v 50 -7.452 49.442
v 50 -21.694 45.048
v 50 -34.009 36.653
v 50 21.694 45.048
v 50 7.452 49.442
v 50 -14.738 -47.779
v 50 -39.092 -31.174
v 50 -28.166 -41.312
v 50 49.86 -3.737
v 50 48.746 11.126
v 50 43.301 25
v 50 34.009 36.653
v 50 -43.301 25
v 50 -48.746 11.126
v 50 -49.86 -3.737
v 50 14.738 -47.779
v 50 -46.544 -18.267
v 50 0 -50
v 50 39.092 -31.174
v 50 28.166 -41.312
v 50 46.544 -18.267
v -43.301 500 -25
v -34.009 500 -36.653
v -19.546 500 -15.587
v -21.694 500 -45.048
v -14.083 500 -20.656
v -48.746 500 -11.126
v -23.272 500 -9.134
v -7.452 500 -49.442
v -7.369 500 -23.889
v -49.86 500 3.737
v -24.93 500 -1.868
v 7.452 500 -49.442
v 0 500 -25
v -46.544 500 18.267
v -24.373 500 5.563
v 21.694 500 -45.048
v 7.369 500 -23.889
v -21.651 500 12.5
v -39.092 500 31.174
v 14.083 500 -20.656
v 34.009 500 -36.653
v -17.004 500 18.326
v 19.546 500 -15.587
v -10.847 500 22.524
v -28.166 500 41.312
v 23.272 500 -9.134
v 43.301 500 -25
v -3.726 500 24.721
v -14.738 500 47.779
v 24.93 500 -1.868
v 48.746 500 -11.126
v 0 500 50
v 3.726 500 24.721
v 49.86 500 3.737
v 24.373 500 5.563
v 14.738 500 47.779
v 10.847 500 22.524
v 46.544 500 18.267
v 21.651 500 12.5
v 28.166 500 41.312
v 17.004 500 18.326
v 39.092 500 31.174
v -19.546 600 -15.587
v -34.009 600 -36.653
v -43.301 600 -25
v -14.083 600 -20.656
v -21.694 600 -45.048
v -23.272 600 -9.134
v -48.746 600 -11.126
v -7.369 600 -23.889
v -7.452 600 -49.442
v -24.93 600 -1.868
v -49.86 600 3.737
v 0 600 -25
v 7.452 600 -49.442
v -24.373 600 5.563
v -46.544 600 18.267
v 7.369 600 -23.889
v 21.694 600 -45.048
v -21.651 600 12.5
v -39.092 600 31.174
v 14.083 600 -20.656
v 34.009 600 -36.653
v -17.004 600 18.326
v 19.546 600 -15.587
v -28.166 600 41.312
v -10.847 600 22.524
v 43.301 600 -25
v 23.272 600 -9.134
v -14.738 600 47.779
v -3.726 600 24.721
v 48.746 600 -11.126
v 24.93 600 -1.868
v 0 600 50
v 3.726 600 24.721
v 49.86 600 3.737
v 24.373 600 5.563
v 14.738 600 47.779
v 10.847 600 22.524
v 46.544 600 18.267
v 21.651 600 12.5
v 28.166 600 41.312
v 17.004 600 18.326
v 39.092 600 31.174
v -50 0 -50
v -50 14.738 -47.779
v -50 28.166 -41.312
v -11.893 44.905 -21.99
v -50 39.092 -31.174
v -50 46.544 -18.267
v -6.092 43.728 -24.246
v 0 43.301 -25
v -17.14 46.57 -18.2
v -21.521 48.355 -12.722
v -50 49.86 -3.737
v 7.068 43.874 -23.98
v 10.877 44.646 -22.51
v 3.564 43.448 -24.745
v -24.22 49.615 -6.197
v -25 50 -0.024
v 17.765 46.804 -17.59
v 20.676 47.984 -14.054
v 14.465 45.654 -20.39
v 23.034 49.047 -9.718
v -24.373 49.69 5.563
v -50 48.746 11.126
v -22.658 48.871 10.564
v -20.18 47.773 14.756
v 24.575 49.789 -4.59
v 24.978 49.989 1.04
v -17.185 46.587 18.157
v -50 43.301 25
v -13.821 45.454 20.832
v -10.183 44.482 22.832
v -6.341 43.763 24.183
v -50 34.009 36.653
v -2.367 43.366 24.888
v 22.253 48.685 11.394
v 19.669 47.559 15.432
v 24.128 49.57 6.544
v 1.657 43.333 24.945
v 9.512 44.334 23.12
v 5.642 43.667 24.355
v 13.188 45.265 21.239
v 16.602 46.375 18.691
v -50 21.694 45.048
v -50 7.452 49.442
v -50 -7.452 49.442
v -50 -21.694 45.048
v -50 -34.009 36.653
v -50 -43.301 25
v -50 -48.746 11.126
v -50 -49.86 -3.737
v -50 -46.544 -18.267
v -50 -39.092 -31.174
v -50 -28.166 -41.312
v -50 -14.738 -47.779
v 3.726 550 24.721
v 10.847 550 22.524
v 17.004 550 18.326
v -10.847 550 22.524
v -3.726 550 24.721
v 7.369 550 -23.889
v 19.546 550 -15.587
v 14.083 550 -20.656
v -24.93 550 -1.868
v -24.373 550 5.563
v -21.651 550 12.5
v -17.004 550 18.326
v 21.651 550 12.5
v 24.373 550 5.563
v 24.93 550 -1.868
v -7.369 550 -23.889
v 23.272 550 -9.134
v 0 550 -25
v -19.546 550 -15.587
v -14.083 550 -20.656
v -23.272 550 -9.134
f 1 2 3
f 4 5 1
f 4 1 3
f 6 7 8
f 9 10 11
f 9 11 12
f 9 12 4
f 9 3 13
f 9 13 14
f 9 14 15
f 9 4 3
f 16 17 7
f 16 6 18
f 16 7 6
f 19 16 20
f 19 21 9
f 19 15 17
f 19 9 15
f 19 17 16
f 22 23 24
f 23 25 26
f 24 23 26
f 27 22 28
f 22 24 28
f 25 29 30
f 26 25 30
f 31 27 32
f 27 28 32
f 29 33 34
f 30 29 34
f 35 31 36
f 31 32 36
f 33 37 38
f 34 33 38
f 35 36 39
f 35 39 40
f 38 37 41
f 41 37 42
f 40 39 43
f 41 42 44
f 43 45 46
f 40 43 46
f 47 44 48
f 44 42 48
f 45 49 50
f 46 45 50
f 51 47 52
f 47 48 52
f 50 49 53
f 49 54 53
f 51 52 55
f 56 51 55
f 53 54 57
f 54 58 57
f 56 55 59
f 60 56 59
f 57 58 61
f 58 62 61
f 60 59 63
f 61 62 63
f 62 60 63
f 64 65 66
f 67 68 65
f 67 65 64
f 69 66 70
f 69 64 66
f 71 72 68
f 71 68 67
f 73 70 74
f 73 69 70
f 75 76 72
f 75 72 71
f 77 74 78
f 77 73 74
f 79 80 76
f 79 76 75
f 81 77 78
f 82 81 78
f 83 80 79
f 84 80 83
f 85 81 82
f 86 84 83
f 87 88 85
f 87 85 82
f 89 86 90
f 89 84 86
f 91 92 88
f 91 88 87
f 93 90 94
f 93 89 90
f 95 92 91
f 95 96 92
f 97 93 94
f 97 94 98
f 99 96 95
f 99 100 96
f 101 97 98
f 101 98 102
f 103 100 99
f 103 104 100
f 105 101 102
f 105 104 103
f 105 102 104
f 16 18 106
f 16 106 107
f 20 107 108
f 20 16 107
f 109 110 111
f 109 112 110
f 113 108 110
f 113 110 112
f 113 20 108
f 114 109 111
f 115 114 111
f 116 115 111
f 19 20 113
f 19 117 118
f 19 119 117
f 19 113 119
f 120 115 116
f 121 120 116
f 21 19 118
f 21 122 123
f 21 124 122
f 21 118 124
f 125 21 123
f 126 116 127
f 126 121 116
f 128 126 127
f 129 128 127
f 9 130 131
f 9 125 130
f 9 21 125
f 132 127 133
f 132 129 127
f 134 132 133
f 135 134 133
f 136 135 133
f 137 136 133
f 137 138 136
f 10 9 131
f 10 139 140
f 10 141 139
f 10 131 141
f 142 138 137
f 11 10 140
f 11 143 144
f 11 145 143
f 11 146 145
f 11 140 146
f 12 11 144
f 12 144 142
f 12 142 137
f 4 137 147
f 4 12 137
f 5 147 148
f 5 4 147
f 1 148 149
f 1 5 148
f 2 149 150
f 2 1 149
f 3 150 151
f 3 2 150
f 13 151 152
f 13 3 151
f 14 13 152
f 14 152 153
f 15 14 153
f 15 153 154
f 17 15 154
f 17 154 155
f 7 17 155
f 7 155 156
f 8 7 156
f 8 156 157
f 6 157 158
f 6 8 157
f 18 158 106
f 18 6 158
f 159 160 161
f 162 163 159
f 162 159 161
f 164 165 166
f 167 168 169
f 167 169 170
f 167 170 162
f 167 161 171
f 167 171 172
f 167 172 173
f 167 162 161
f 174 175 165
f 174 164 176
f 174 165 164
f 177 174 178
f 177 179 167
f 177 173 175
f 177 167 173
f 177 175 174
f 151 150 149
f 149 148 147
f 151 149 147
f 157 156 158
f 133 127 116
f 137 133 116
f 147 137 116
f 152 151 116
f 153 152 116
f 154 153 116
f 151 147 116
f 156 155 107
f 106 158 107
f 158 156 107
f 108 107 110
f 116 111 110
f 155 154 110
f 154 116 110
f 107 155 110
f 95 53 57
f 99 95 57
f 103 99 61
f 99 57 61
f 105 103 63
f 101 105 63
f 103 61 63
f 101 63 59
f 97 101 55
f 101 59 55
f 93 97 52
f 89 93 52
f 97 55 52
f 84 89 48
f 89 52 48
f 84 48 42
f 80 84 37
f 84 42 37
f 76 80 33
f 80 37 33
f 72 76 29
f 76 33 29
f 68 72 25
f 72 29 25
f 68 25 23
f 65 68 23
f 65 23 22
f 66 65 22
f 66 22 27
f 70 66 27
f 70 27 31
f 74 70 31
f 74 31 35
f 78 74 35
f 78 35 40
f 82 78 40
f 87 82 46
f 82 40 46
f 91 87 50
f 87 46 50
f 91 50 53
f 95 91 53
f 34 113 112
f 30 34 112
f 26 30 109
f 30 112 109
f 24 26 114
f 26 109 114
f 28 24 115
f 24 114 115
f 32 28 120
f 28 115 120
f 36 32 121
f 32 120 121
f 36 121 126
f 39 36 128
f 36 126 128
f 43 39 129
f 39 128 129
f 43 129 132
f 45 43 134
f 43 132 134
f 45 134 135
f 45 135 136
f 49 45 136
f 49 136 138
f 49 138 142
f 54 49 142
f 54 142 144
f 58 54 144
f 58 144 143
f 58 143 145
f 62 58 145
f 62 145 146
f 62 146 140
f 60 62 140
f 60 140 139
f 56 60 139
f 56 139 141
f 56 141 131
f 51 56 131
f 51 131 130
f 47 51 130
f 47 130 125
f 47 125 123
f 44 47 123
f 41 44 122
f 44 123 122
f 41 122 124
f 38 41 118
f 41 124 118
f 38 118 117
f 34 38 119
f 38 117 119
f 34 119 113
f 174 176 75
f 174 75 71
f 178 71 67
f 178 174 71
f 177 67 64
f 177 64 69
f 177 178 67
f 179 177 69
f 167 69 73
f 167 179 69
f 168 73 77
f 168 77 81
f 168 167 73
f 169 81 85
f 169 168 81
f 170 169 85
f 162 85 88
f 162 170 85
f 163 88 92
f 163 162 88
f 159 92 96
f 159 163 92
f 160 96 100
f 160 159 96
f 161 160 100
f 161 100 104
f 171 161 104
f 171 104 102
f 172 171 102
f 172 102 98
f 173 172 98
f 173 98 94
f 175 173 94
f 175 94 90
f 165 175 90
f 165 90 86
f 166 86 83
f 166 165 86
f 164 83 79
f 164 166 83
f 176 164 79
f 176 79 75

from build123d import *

# Parameters (mm, degrees)
CROQUIS1_R              = 50
SALIENTE_EXTRUIR1_DEPTH = 50
CROQUIS2_R              = 25
SALIENTE_EXTRUIR2_DEPTH = 500
CROQUIS3_R              = 50
SALIENTE_EXTRUIR3_DEPTH = 100
CORTAR_EXTRUIR1_START   = -50
CROQUIS4_R              = 25
CORTAR_EXTRUIR1_DEPTH   = 50


with BuildPart() as part:
    # Croquis1 → Saliente-Extruir1 (new, symmetric)
    with BuildSketch(Plane(origin=(0, 0, 0), x_dir=(0, 0, -1), z_dir=(1, 0, 0))):
        Circle(CROQUIS1_R)
    extrude(amount=SALIENTE_EXTRUIR1_DEPTH, both=True)

    # Croquis2 → Saliente-Extruir2 (add)
    with BuildSketch(Plane(origin=(0, 0, 0), x_dir=(1, 0, 0), z_dir=(0, 1, 0))):
        with Locations(Location((0, 0, 0), (0, 0, 90))):
            Circle(CROQUIS2_R)
    extrude(amount=SALIENTE_EXTRUIR2_DEPTH)

    # Croquis3 → Saliente-Extruir3 (add)
    with BuildSketch(Plane(origin=(0, 500, 0), x_dir=(1, 0, 0), z_dir=(0, 1, 0))):
        with Locations(Location((0, 0, 0), (0, 0, 270))):
            Circle(CROQUIS3_R)
    extrude(amount=SALIENTE_EXTRUIR3_DEPTH)

    # Croquis4 → Cortar-Extruir1 (cut)
    with BuildSketch(Plane(origin=(0, 600, 0), x_dir=(1, 0, 0), z_dir=(0, 1, 0)).offset(CORTAR_EXTRUIR1_START)):
        with Locations(Location((0, 0, 0), (0, 0, 90))):
            Circle(CROQUIS4_R)
    extrude(amount=CORTAR_EXTRUIR1_DEPTH, mode=Mode.SUBTRACT)


solid = part.part
